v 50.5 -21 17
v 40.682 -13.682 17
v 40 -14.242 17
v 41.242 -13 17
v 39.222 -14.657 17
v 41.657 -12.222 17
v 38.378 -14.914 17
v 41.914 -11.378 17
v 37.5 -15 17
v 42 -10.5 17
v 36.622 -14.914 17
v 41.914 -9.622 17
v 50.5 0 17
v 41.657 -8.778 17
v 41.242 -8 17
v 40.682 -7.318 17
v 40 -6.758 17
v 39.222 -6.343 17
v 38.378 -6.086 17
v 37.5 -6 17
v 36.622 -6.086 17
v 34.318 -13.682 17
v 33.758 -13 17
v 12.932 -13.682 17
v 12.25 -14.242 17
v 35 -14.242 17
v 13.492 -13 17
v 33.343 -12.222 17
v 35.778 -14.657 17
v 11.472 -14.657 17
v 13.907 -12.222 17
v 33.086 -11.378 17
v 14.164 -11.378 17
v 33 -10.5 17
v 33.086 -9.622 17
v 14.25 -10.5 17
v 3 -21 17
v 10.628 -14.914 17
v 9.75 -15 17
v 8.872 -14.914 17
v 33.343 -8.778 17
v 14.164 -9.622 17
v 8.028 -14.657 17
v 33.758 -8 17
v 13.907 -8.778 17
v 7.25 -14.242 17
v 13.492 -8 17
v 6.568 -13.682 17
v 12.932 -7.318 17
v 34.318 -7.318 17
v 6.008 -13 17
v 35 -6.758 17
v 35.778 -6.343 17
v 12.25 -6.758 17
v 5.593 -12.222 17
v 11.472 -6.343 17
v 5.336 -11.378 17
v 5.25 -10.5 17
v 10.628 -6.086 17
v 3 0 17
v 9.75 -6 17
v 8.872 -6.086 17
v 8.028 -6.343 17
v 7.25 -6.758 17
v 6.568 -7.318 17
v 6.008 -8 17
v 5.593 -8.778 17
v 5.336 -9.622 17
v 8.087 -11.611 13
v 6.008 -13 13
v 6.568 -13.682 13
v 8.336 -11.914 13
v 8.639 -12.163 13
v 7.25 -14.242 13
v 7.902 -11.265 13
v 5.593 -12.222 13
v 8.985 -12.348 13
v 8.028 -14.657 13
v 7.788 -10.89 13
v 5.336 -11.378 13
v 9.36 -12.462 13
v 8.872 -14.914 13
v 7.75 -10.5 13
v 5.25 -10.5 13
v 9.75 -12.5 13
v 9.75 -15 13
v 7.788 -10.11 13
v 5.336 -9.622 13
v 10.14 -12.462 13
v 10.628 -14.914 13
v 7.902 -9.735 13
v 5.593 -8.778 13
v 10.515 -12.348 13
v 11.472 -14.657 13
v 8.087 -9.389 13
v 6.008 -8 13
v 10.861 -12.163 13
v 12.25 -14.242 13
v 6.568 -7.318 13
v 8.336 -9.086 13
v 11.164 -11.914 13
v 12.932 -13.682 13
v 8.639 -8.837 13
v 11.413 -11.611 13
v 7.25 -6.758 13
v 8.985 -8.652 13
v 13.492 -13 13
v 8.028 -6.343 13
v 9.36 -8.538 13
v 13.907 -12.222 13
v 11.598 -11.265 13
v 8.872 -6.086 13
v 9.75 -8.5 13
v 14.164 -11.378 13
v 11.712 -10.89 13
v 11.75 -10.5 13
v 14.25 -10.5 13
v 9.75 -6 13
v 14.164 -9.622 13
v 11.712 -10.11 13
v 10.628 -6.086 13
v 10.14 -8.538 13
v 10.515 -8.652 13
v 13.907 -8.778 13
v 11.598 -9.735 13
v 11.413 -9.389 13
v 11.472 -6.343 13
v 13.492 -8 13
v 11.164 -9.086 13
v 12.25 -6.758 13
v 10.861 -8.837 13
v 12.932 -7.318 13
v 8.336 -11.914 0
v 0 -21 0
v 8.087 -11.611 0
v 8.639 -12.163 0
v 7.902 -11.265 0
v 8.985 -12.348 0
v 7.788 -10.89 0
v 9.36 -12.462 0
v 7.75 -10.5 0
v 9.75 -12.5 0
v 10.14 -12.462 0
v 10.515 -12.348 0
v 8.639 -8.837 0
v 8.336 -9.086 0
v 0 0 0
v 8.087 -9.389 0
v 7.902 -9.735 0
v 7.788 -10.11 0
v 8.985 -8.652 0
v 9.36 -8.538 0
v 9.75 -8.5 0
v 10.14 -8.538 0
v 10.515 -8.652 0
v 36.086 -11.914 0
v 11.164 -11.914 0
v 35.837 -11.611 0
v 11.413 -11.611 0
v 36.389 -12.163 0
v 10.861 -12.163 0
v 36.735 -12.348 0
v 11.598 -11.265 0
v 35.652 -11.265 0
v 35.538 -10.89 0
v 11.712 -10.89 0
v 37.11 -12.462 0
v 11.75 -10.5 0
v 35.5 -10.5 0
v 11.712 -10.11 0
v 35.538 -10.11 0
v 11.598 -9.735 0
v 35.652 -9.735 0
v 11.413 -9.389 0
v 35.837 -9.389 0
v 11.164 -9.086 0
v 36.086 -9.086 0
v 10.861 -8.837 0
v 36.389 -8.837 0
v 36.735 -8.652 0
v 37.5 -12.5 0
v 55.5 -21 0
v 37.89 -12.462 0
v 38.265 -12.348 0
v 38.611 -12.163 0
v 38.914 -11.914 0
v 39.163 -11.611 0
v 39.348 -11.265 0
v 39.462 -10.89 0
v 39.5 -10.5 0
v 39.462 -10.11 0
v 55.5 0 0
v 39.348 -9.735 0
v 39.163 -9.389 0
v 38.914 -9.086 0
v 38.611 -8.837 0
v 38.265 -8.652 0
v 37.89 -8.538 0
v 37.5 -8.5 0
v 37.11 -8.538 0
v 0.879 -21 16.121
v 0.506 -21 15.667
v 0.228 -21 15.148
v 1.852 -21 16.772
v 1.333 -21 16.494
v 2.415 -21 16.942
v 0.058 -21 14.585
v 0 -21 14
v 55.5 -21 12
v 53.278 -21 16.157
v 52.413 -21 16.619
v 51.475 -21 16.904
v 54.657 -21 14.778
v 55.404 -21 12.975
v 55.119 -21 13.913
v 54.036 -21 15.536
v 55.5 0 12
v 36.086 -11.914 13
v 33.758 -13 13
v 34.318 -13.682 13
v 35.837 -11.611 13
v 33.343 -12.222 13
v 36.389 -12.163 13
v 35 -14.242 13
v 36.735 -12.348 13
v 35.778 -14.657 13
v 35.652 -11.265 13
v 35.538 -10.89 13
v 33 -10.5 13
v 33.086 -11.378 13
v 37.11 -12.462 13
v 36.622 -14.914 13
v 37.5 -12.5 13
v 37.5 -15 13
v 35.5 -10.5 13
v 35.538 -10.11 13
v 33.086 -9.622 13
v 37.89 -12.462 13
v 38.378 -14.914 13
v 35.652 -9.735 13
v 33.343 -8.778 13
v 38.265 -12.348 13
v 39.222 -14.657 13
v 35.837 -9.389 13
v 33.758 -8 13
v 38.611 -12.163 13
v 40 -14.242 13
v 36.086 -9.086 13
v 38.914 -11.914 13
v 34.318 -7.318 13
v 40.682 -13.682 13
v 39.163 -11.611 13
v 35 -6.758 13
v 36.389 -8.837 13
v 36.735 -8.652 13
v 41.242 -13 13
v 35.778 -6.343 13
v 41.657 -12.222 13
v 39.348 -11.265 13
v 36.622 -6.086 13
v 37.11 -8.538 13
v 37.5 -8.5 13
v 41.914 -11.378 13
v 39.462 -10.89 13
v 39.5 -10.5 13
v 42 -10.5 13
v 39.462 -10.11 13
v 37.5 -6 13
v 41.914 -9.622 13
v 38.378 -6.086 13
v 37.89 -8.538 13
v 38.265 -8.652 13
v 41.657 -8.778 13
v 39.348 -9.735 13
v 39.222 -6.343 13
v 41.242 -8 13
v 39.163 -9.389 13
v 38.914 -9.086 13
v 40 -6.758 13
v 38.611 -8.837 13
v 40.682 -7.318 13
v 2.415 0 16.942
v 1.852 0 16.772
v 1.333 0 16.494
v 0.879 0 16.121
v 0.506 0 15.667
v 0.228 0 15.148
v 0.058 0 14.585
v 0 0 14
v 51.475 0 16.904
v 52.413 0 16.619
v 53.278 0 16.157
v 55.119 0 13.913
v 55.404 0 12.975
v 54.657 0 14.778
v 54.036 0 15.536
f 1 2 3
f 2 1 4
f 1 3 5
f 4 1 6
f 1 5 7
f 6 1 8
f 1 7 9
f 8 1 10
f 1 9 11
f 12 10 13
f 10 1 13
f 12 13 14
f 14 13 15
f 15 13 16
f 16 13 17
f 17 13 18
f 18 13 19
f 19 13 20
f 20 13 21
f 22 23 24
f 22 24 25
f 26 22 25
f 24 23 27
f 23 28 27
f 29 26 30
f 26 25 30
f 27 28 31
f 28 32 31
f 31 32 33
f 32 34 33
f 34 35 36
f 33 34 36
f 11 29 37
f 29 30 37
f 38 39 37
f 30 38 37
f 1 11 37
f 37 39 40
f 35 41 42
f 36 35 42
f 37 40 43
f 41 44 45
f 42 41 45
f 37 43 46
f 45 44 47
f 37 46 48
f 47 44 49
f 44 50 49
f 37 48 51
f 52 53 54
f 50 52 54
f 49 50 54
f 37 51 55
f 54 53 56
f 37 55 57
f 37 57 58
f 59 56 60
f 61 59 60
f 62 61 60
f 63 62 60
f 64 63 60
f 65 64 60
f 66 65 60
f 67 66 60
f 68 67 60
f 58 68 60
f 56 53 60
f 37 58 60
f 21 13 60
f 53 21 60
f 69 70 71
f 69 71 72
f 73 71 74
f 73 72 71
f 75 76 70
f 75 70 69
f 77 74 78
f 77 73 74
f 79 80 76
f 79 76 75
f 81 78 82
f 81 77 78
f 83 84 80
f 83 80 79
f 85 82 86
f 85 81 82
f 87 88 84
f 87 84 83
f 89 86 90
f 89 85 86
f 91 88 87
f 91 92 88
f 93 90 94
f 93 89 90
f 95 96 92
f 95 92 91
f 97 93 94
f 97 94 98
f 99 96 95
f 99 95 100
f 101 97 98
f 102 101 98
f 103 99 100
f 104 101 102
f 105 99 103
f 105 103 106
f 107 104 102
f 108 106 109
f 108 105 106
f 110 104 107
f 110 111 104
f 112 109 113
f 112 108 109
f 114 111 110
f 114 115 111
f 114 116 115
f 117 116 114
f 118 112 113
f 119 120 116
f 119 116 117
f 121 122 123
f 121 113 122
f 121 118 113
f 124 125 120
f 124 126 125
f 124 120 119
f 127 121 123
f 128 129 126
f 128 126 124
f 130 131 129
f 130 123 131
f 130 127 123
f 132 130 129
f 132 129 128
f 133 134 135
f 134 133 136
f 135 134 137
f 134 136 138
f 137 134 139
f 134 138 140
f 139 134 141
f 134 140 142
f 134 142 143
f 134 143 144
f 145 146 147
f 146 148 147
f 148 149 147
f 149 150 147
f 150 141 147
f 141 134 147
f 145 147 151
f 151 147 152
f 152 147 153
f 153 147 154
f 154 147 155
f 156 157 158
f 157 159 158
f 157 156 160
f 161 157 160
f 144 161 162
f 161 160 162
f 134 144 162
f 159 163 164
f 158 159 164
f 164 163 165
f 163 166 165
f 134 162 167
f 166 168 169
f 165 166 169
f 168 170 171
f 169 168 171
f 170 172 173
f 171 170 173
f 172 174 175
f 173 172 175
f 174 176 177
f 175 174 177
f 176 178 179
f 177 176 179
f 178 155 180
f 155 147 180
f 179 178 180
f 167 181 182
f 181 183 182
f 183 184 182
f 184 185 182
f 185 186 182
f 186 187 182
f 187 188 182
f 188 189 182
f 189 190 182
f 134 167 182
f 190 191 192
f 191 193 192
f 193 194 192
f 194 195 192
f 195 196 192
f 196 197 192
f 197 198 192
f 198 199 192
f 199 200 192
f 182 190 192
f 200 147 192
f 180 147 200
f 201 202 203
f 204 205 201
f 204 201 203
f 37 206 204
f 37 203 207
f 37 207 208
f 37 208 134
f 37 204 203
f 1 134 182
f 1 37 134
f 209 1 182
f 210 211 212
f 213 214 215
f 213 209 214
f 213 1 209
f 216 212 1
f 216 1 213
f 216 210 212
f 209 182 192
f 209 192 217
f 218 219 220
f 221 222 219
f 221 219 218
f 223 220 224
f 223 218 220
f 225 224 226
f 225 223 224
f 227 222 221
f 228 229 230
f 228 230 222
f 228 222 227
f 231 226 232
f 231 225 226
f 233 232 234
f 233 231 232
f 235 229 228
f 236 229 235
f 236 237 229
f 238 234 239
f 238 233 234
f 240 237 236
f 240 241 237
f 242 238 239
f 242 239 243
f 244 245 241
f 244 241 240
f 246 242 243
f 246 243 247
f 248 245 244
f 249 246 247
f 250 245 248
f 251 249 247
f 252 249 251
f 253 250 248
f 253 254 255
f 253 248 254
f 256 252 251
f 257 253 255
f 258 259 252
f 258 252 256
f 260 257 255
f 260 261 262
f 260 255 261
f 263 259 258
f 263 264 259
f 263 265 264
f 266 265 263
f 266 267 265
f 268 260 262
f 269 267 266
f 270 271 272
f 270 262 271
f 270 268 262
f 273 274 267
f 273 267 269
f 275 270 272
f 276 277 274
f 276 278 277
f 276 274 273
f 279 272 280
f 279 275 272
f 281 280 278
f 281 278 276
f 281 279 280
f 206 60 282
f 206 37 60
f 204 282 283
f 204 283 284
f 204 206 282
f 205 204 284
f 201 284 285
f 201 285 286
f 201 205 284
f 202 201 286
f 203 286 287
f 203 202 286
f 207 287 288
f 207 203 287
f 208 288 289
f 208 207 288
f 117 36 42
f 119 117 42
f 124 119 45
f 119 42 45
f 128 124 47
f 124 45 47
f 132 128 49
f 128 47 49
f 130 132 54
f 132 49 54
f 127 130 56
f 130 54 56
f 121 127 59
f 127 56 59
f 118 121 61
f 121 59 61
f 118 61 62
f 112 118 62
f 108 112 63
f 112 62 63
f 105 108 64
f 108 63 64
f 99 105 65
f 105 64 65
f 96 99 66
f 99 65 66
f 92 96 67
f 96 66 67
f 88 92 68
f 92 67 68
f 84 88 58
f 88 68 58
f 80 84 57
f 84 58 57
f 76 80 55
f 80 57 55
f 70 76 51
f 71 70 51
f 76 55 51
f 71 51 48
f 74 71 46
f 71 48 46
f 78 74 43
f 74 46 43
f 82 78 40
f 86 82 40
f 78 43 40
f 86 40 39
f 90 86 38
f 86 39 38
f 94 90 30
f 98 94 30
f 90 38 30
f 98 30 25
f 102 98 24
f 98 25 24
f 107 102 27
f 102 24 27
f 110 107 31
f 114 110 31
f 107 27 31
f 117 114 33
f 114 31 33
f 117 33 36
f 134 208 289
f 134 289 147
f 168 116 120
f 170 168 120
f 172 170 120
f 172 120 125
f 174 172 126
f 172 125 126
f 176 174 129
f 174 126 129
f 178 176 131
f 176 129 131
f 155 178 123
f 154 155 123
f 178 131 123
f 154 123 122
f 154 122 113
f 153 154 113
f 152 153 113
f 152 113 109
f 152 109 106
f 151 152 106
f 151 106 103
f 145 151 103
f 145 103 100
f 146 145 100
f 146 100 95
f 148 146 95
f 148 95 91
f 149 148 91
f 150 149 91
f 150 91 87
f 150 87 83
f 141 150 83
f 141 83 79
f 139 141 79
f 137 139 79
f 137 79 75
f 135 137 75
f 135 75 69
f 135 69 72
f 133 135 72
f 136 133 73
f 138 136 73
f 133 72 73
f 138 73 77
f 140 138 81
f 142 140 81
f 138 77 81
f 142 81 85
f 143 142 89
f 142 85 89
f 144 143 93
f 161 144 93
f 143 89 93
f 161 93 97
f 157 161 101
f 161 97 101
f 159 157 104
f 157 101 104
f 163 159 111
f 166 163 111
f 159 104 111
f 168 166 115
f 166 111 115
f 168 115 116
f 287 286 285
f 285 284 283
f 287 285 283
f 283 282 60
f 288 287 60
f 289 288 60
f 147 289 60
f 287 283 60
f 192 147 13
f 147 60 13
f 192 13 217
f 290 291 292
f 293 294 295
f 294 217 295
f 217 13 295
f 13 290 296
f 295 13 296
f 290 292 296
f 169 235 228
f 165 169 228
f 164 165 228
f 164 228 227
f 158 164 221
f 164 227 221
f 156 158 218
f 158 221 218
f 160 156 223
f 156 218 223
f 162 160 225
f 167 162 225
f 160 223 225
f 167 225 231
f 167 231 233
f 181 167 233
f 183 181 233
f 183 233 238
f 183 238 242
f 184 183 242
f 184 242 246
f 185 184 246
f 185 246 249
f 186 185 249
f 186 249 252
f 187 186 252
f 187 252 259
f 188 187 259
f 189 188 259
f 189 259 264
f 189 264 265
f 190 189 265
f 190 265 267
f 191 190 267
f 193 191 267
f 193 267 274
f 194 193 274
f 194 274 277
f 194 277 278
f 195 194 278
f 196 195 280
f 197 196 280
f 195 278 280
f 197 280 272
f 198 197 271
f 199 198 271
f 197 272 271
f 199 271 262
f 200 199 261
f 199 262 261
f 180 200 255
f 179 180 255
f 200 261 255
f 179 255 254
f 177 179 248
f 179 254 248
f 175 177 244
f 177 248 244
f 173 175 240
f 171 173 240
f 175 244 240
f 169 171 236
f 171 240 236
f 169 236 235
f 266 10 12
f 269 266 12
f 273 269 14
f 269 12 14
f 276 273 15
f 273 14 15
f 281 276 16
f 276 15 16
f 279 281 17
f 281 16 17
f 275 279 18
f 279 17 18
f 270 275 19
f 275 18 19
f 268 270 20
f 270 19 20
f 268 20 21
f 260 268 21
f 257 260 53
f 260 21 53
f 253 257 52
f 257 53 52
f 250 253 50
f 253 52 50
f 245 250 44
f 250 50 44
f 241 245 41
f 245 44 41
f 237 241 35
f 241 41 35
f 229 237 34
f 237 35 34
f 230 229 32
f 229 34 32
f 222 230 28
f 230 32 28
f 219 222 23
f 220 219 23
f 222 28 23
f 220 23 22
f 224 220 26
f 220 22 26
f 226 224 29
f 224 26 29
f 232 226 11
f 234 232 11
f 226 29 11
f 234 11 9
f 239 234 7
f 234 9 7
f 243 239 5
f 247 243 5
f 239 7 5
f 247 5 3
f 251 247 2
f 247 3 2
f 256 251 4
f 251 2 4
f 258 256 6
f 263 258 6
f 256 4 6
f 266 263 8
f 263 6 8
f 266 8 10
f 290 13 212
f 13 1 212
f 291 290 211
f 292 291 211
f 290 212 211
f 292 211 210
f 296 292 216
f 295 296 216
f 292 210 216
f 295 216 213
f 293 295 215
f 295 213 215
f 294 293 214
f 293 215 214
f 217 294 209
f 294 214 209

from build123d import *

# Parameters (mm, degrees)
F1_DEPTH = 21
F2_R     = 5
F4_DEPTH = 25
F5_R     = 3
F6_R     = 4.5
F7_DEPTH = 4


with BuildPart() as f1:
    # F0 (on Front) → F1 (new body)
    with BuildSketch(Plane.XZ):
        Polygon((55.5, 17), (6.891753, 17), (0, 17), (0, 0), (55.5, 0), align=None)
    extrude(amount=F1_DEPTH)

    # F2
    f2_edges = [f1.edges().sort_by_distance(p)[0] for p in [
        (55.5, -10.5, 17),
    ]]
    fillet(f2_edges, radius=F2_R)

    # F3 (on face) → F4 (cut)
    with BuildSketch(Plane.XY.offset(17)):
        with BuildLine():
            ThreePointArc((39.5, -10.5), (37.5, -8.5), (35.5, -10.5))
            Line((35.5, -10.5), (39.5, -10.5))
        make_face()
        with BuildLine():
            Line((39.5, -10.5), (35.5, -10.5))
            ThreePointArc((35.5, -10.5), (37.5, -12.5), (39.5, -10.5))
        make_face()
        with BuildLine():
            ThreePointArc((7.75, -10.5), (9.75, -12.5), (11.75, -10.5))
            Line((11.75, -10.5), (7.75, -10.5))
        make_face()
        with BuildLine():
            Line((7.75, -10.5), (11.75, -10.5))
            ThreePointArc((11.75, -10.5), (9.75, -8.5), (7.75, -10.5))
        make_face()
    extrude(amount=-F4_DEPTH, mode=Mode.SUBTRACT)

    # F5
    f5_edges = [f1.edges().sort_by_distance(p)[0] for p in [
        (0, -10.5, 17),
    ]]
    fillet(f5_edges, radius=F5_R)

    # F6 (on face) → F7 (cut)
    with BuildSketch(Plane.XY.offset(17)):
        with Locations((9.75, -10.5)):
            Circle(F6_R)
        with Locations((37.5, -10.5)):
            Circle(F6_R)
    extrude(amount=-F7_DEPTH, mode=Mode.SUBTRACT)


solid = f1.part
